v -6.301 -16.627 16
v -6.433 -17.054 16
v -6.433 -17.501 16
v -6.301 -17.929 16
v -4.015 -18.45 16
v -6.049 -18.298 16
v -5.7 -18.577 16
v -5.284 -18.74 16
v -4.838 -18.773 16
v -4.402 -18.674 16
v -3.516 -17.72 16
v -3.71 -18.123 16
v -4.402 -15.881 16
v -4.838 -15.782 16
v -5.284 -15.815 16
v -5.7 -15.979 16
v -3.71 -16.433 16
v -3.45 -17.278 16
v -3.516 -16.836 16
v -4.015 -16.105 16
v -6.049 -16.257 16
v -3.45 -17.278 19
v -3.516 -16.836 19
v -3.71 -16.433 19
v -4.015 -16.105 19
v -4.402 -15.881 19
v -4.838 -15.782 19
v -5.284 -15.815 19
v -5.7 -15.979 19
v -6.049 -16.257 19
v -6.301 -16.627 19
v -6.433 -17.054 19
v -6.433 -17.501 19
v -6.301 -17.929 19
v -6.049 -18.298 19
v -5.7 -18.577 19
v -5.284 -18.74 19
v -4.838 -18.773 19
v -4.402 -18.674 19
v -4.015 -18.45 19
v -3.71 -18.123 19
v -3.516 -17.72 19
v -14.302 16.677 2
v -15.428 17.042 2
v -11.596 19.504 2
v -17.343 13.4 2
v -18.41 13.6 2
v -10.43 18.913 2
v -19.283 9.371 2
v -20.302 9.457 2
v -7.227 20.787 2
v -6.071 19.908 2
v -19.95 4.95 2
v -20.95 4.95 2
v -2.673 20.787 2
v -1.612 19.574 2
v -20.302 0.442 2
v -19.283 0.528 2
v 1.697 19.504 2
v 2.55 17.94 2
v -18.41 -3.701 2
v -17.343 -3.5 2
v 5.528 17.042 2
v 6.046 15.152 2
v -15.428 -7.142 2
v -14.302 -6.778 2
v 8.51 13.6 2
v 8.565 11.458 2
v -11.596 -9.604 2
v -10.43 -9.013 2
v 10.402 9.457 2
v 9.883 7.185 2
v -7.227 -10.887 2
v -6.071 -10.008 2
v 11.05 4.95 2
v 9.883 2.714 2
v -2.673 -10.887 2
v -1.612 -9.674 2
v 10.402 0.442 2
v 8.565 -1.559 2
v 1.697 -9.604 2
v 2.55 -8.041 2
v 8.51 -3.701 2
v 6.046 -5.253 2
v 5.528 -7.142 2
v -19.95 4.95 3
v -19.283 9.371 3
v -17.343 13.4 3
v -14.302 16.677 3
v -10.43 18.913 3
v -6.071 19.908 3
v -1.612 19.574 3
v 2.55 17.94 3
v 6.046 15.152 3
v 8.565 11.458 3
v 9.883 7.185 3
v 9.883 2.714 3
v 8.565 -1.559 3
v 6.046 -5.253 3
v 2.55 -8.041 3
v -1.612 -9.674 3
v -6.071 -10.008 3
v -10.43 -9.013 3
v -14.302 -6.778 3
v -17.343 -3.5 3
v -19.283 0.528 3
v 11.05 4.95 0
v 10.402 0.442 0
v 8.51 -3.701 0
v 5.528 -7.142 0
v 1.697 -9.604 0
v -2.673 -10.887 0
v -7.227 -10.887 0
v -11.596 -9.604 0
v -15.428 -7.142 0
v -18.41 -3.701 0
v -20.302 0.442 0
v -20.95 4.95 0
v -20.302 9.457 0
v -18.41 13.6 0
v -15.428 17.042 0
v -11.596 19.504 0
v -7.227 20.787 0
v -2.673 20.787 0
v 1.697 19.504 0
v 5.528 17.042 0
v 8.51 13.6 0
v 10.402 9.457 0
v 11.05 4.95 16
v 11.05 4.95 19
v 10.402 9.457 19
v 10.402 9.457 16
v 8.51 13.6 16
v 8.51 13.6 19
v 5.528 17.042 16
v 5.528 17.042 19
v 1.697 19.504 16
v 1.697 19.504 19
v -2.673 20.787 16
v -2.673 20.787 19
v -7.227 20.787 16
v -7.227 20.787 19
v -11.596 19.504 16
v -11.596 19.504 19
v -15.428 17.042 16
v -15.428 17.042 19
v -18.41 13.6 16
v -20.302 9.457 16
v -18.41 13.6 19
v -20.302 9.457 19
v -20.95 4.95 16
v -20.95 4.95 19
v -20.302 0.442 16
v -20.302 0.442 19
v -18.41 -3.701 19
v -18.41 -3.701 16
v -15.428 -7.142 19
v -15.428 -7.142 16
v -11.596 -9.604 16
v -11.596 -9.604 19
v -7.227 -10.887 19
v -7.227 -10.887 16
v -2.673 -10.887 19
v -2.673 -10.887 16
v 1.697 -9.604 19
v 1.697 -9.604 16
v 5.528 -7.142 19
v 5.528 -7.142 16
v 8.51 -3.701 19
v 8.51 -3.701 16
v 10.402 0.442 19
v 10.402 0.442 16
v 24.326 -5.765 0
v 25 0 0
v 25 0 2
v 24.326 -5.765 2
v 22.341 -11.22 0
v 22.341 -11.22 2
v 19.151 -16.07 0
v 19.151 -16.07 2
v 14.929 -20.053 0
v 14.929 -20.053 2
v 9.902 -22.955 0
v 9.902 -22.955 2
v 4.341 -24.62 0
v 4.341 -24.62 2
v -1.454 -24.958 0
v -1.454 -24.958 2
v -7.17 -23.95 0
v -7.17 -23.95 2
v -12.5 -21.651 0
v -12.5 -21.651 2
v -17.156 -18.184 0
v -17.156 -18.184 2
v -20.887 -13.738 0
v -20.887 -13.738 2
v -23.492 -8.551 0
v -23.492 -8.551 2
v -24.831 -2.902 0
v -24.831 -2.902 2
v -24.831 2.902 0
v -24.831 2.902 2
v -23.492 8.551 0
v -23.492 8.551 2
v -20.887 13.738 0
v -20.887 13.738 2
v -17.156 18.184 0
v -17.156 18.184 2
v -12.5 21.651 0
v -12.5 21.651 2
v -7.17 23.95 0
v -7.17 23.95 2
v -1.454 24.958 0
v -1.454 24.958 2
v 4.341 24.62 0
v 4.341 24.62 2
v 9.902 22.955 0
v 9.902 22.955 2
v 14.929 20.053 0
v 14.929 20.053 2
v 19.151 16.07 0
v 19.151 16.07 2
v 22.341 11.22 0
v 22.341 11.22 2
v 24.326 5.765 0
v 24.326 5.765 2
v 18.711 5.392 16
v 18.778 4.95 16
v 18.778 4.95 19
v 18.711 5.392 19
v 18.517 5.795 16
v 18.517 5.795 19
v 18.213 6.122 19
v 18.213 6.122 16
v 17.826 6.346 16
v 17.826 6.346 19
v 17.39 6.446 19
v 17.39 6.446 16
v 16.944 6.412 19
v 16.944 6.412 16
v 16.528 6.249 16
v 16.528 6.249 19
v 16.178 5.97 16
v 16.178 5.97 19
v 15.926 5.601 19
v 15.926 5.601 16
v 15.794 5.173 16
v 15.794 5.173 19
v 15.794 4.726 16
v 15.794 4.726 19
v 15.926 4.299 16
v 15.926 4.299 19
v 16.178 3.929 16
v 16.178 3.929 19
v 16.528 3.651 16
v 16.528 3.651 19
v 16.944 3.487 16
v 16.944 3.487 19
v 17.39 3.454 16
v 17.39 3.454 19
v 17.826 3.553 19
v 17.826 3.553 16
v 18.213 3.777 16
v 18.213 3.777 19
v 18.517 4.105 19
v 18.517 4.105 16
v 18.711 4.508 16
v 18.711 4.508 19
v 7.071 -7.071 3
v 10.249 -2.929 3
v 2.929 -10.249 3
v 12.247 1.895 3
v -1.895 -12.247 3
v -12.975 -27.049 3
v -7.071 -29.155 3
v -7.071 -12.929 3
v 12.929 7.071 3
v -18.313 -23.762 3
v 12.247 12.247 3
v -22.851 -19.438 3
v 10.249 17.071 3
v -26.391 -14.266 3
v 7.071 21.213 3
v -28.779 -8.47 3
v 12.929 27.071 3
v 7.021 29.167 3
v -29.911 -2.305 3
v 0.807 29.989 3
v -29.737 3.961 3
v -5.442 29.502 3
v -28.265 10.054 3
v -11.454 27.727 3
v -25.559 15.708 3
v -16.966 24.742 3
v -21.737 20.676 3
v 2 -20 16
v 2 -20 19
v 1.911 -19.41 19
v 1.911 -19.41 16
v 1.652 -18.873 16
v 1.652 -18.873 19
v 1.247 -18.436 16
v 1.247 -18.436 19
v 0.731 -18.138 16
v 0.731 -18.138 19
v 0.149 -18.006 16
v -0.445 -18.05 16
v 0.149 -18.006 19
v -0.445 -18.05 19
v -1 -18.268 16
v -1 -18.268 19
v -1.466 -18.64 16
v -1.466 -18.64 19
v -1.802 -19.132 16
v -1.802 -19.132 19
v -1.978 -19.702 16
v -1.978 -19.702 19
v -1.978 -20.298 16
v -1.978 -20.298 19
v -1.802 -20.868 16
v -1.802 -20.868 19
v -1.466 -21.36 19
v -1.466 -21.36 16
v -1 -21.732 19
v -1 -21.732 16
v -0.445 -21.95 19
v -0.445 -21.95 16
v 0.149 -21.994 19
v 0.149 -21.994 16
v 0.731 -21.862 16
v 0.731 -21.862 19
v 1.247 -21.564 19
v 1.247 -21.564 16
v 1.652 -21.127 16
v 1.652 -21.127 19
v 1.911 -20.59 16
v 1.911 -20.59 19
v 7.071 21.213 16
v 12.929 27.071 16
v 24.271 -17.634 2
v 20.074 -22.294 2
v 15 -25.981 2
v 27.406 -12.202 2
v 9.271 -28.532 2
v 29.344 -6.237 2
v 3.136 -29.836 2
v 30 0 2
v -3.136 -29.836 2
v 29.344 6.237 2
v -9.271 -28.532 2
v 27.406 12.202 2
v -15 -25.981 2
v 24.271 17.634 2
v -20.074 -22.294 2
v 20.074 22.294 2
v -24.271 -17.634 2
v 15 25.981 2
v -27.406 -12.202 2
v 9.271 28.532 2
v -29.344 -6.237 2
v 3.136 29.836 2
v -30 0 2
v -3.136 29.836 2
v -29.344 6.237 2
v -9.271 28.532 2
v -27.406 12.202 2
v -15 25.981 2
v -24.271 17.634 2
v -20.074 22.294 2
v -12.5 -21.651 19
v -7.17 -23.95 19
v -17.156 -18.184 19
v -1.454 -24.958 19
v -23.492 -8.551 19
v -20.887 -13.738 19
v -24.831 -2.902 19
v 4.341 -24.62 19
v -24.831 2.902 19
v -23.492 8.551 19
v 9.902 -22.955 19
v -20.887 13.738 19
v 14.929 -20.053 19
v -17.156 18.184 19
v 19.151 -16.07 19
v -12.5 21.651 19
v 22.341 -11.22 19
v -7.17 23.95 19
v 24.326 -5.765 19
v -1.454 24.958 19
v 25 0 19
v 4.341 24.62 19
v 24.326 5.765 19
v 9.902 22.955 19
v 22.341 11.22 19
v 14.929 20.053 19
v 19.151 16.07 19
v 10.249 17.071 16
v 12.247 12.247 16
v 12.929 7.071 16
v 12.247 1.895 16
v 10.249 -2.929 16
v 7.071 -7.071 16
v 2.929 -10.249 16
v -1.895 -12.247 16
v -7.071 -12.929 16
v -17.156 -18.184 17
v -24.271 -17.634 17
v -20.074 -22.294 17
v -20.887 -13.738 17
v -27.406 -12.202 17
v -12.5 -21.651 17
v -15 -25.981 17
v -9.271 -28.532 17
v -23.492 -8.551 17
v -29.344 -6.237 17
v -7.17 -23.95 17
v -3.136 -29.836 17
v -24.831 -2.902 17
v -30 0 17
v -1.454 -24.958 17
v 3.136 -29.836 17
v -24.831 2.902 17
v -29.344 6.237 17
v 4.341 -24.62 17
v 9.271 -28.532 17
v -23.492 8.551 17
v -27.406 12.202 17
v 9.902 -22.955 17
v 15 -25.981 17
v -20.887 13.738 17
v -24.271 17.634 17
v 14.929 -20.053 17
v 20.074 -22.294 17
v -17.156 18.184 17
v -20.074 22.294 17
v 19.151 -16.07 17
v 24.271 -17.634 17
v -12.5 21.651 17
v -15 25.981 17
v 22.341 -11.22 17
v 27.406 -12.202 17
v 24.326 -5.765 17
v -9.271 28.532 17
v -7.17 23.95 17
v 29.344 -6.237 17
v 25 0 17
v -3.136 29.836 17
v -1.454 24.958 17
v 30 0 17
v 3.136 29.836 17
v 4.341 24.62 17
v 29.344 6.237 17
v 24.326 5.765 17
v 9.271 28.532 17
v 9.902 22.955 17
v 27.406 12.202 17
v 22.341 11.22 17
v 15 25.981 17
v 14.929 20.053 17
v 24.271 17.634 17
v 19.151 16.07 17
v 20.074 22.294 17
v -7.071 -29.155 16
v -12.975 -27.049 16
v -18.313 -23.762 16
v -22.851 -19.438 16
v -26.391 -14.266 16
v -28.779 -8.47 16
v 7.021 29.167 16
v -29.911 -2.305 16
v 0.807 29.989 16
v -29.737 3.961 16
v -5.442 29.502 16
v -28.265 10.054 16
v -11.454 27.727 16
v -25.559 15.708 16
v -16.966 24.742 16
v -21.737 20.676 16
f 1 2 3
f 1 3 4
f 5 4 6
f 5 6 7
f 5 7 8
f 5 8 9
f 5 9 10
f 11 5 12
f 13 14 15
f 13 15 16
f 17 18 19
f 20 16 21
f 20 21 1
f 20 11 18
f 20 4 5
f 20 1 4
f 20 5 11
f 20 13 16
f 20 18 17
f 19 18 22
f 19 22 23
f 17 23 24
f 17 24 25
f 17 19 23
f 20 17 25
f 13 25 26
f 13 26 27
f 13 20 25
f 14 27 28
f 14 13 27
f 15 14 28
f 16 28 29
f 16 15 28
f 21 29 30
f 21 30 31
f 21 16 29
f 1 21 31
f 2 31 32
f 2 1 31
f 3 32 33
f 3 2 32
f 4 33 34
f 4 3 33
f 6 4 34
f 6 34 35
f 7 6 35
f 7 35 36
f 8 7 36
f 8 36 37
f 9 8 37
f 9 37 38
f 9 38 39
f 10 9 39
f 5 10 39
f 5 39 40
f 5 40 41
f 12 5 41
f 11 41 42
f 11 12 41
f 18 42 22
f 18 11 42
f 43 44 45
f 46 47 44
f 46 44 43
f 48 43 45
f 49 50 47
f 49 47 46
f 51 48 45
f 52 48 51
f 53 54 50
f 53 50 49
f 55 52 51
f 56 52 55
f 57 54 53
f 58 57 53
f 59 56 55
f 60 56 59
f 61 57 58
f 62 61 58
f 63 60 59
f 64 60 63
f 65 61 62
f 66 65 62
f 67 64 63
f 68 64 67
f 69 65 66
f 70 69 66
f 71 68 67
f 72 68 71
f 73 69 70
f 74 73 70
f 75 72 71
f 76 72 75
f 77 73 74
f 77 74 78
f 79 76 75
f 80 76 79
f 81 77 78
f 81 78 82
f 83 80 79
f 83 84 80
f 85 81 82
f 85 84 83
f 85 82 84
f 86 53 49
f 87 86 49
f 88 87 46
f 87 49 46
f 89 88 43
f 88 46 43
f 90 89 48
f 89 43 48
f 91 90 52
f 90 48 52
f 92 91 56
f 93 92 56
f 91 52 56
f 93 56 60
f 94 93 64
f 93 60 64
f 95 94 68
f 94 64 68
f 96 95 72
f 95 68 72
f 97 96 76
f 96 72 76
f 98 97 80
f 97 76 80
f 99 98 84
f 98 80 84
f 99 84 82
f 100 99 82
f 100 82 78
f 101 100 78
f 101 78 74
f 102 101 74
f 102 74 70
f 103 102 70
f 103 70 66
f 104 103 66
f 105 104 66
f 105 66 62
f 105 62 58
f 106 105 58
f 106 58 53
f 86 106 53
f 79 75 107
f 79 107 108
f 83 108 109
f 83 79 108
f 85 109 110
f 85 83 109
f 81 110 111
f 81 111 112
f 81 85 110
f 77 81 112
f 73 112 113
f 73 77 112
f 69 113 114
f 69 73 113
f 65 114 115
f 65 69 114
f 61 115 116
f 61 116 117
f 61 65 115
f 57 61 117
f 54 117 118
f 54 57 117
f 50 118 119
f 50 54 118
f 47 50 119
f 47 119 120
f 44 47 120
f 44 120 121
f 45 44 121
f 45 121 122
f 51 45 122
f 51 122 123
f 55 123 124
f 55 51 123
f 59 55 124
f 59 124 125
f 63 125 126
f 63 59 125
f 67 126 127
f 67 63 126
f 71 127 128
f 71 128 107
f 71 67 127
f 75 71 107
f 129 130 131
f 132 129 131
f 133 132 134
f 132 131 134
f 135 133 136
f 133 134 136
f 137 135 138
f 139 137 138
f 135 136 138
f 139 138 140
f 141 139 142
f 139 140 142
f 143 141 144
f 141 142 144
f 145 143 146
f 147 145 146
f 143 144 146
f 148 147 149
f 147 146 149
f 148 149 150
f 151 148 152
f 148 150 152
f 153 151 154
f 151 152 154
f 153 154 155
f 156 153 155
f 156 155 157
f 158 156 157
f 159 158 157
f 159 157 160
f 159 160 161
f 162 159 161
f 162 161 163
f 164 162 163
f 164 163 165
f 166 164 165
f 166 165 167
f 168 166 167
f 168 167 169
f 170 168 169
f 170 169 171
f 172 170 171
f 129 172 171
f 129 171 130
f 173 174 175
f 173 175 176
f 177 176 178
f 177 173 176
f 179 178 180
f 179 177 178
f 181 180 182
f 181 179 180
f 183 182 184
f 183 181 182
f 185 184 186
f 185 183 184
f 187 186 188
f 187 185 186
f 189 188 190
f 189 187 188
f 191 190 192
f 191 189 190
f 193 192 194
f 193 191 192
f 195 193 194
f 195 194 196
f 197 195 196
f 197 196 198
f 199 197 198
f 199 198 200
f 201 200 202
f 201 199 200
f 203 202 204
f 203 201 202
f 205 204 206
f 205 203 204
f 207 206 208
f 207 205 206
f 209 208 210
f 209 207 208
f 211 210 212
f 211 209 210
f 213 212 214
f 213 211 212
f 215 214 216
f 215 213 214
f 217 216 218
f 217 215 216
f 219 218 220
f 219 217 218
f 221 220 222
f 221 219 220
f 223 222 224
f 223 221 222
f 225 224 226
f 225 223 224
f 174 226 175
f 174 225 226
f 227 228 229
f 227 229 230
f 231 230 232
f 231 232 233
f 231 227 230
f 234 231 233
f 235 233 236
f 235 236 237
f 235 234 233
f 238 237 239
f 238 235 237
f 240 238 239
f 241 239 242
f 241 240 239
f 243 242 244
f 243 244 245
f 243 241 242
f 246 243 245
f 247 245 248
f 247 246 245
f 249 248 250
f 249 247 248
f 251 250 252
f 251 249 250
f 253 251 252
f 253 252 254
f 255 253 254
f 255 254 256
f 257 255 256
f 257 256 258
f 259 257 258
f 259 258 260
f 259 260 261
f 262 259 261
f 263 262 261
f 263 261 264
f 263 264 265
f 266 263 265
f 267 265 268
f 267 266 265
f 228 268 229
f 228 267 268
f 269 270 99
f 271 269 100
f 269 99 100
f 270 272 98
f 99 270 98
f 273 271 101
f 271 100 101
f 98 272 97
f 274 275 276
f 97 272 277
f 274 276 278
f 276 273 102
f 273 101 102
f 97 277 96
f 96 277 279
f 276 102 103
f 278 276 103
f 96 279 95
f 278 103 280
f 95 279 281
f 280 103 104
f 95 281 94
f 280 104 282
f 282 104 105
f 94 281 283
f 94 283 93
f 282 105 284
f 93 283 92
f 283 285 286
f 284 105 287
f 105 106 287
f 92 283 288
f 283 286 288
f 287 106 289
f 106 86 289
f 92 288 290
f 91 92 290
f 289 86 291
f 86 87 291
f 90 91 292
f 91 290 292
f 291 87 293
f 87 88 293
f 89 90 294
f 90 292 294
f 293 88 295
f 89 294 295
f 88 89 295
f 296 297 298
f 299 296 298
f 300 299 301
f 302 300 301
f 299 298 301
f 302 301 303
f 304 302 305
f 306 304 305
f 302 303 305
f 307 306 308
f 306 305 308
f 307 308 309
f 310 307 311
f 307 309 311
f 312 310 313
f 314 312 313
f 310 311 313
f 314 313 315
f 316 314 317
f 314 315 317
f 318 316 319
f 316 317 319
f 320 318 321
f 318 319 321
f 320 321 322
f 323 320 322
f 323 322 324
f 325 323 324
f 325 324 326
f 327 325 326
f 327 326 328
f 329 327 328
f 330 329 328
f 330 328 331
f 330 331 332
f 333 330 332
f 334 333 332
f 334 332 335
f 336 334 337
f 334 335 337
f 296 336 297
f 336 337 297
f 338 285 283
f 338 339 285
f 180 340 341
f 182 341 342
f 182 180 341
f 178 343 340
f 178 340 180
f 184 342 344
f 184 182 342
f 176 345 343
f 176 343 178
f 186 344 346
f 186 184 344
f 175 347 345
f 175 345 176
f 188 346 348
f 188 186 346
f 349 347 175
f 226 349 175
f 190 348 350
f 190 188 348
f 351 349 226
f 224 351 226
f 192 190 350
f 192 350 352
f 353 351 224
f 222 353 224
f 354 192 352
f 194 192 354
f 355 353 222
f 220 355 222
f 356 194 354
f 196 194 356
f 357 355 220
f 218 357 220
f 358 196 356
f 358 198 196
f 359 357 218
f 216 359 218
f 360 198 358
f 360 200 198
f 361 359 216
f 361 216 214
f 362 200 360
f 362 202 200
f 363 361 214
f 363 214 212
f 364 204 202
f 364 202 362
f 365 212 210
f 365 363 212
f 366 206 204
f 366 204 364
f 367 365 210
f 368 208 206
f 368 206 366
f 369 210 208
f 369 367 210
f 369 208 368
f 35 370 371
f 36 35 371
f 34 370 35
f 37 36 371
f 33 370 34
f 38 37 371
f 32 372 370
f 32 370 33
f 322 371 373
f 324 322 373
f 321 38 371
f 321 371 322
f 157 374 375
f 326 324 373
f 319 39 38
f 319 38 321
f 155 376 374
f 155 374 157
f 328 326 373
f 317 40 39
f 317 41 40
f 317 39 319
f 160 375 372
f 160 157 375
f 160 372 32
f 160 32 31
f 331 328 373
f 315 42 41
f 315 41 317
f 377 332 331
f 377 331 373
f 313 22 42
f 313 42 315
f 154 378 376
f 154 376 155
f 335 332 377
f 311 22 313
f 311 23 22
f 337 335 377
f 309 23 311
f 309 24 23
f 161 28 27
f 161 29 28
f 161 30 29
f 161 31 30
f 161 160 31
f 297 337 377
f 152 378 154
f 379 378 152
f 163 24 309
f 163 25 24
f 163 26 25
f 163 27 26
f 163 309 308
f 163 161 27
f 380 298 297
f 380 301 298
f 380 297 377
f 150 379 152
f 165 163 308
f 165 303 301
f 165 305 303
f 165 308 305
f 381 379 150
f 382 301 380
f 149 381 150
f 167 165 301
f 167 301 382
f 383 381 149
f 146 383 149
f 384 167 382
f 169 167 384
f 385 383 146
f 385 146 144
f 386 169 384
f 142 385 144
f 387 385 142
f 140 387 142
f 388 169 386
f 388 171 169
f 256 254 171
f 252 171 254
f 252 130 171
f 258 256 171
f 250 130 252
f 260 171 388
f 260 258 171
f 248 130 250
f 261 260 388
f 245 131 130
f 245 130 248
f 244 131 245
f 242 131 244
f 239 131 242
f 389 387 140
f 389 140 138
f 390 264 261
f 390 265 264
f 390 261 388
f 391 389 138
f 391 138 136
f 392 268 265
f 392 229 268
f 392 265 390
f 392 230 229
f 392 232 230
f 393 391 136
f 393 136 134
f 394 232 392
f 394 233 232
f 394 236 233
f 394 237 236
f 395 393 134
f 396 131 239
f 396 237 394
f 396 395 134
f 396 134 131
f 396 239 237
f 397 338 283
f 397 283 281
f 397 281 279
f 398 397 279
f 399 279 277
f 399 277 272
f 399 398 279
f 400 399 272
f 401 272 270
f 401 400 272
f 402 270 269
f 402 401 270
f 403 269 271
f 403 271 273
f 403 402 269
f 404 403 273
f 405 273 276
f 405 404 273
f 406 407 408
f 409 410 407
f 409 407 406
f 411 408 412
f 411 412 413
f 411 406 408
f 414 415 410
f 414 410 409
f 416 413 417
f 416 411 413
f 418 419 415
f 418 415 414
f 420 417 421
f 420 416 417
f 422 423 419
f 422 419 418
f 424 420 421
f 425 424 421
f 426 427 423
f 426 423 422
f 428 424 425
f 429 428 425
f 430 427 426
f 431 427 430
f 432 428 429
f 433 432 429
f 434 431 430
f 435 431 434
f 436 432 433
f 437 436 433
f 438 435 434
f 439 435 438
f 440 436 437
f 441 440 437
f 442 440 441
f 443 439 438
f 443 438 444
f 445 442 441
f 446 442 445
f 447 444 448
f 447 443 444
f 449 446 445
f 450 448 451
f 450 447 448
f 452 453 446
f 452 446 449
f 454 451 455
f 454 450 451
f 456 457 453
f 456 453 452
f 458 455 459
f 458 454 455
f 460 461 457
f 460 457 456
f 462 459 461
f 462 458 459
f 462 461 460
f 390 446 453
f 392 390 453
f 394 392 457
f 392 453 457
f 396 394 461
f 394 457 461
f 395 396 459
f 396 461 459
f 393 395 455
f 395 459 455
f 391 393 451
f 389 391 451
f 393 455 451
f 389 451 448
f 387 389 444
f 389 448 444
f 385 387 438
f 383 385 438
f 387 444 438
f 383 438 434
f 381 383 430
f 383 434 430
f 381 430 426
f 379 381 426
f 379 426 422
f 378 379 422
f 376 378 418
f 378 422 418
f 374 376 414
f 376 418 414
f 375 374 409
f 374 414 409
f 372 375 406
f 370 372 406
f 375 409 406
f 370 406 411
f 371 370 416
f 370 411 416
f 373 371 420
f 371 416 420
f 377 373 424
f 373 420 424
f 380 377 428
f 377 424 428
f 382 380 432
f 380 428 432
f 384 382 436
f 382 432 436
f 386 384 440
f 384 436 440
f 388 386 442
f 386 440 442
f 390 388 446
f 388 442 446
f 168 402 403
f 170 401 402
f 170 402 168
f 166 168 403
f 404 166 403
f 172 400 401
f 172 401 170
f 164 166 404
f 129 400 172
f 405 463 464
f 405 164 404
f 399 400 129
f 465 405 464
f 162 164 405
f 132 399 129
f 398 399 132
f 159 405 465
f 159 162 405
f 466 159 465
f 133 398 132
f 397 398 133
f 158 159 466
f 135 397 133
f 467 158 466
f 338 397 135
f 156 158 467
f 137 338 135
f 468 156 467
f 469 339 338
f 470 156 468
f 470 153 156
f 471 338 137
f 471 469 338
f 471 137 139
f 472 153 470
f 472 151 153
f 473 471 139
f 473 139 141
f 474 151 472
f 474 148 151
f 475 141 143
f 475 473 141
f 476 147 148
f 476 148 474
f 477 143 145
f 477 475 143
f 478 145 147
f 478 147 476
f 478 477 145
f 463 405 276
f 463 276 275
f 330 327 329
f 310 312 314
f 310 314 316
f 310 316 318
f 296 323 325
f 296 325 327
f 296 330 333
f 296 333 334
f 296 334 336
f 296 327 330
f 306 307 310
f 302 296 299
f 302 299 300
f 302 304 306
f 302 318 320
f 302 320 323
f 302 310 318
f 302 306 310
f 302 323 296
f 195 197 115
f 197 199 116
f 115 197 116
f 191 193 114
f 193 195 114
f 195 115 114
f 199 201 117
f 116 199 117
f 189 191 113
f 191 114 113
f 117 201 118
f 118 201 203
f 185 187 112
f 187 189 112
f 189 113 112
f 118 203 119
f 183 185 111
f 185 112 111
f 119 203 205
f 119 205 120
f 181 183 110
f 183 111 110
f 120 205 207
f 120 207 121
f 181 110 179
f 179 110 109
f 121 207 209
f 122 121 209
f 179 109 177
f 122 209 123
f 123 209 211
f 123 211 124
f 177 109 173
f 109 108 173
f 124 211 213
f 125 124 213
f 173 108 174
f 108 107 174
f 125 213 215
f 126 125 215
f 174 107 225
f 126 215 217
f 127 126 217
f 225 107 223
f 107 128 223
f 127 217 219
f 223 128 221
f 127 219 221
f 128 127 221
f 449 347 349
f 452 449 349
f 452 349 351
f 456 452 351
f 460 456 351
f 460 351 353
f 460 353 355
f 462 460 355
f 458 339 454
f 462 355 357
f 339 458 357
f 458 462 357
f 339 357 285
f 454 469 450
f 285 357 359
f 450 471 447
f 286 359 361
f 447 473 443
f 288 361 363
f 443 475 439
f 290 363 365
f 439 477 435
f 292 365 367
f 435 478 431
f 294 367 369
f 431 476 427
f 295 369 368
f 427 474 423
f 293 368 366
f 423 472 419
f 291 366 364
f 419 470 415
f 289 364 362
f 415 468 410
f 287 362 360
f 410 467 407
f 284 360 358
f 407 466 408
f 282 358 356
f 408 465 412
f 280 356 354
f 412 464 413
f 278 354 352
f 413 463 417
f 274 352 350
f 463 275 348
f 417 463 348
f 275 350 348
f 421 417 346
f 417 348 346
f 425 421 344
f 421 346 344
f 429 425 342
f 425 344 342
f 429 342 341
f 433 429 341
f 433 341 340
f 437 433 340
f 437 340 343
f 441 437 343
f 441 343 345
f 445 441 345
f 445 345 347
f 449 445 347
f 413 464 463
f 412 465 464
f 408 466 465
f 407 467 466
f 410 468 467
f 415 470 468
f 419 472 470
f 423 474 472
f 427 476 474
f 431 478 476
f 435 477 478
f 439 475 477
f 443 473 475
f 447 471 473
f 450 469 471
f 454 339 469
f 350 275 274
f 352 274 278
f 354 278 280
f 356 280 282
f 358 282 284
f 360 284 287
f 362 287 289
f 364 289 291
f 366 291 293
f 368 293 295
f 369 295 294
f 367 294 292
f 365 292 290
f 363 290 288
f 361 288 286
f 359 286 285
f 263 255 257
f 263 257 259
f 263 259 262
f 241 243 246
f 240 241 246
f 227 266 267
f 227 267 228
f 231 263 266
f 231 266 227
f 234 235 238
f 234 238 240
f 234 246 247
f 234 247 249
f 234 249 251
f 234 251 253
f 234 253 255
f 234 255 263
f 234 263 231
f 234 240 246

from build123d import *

# Parameters (mm, degrees)
SKETCH1_R           = 30
BOSS_EXTRUDE1_DEPTH = 19
CUT_EXTRUDE1_START  = -2
SKETCH2_R           = 30
SKETCH2_R_2         = 25
CUT_EXTRUDE1_DEPTH  = 2
SKETCH3_R           = 30
SKETCH3_R_2         = 25
CUT_EXTRUDE2_DEPTH  = 2
CUT_EXTRUDE3_DEPTH  = 6.5
CUT_EXTRUDE4_REACH  = 48.487
SKETCH11_R          = 16
CUT_EXTRUDE5_REACH  = 48.487
SKETCH12_R          = 15
CUT_EXTRUDE6_START  = -2
SKETCH13_R          = 16
CUT_EXTRUDE6_DEPTH  = 2
SKETCH14_R          = 2
CUT_EXTRUDE7_DEPTH  = 3
CUT_EXTRUDE8_START  = -3
SKETCH15_R          = 1.5
SKETCH15_R_2        = 15
CUT_EXTRUDE8_DEPTH  = 3


with BuildPart() as part:
    # Sketch1 → Boss-Extrude1 (new body)
    with BuildSketch(Plane.XY):
        Circle(SKETCH1_R)
    extrude(amount=BOSS_EXTRUDE1_DEPTH)

    # Sketch2 → Cut-Extrude1 (cut)
    with BuildSketch(Plane.XY.offset(19).offset(CUT_EXTRUDE1_START)):
        Circle(SKETCH2_R)
        Circle(SKETCH2_R_2, mode=Mode.SUBTRACT)
    extrude(amount=CUT_EXTRUDE1_DEPTH, mode=Mode.SUBTRACT)

    # Sketch3 → Cut-Extrude2 (cut)
    with BuildSketch(Plane(origin=(0, 0, 0), x_dir=(-1, 0, 0), z_dir=(0, 0, -1))):
        Circle(SKETCH3_R)
        with Locations(Location((0, 0, 0), (0, 0, 180))):
            Circle(SKETCH3_R_2, mode=Mode.SUBTRACT)
    extrude(amount=-CUT_EXTRUDE2_DEPTH, mode=Mode.SUBTRACT)

    # Sketch10 → Cut-Extrude3 (cut, symmetric)
    with BuildSketch(Plane.XY.offset(9.5)):
        with BuildLine():
            Line((-7.071067812, -12.928932188), (-7.071067812, -29.154759474))
            ThreePointArc((-7.071067812, -29.154759474), (-28.265076636, 10.054125657), (12.928932188, 27.071067812))
            Line((12.928932188, 27.071067812), (7.071067812, 21.213203436))
            ThreePointArc((7.071067812, 21.213203436), (11.406522838, -0.582600835), (-7.071067812, -12.928932188))
        make_face()
    extrude(amount=CUT_EXTRUDE3_DEPTH, both=True, mode=Mode.SUBTRACT)

    # Sketch11 → Cut-Extrude4 (cut, up to next)
    with BuildSketch(Plane.XY.offset(19), mode=Mode.PRIVATE) as cut_extrude4_sk1:
        with Locations((-4.949747468, 4.949747468)):
            Circle(SKETCH11_R)
    cut_extrude4_tool1 = extrude(cut_extrude4_sk1.sketch, amount=-CUT_EXTRUDE4_REACH, mode=Mode.PRIVATE) & part.part
    add(cut_extrude4_tool1.solids().sort_by_distance((-4.949747, 4.949747, 19))[0], mode=Mode.SUBTRACT)

    # Sketch12 → Cut-Extrude5 (cut, up to next)
    with BuildSketch(Plane(origin=(0, 0, 0), x_dir=(-1, 0, 0), z_dir=(0, 0, -1)), mode=Mode.PRIVATE) as cut_extrude5_sk1:
        with Locations((4.949747468, 4.949747468)):
            Circle(SKETCH12_R)
    cut_extrude5_tool1 = extrude(cut_extrude5_sk1.sketch, amount=-CUT_EXTRUDE5_REACH, mode=Mode.PRIVATE) & part.part
    add(cut_extrude5_tool1.solids().sort_by_distance((-4.949747, 4.949747, 0))[0], mode=Mode.SUBTRACT)

    # Sketch13 → Cut-Extrude6 (cut)
    with BuildSketch(Plane(origin=(0, 0, 0), x_dir=(-1, 0, 0), z_dir=(0, 0, -1)).offset(CUT_EXTRUDE6_START)):
        with Locations(Location((4.949747468, 4.949747468, 0), (0, 0, 180))):
            Circle(SKETCH13_R)
    extrude(amount=CUT_EXTRUDE6_DEPTH, mode=Mode.SUBTRACT)

    # Sketch14 → Cut-Extrude7 (cut)
    with BuildSketch(Plane.XY.offset(19)):
        with Locations((0, -20)):
            Circle(SKETCH14_R)
    extrude(amount=-CUT_EXTRUDE7_DEPTH, mode=Mode.SUBTRACT)

    # Sketch15 → Cut-Extrude8 (cut)
    with BuildSketch(Plane.XY.offset(19).offset(CUT_EXTRUDE8_START)):
        with Locations((-4.949747468, -17.277677021)):
            Circle(SKETCH15_R)
        with Locations(Location((-4.949747468, 4.949747468, 0), (0, 0, 180))):
            Circle(SKETCH15_R_2)
        with Locations((17.277677021, 4.949747468)):
            Circle(SKETCH15_R)
    extrude(amount=CUT_EXTRUDE8_DEPTH, mode=Mode.SUBTRACT)


solid = part.part
